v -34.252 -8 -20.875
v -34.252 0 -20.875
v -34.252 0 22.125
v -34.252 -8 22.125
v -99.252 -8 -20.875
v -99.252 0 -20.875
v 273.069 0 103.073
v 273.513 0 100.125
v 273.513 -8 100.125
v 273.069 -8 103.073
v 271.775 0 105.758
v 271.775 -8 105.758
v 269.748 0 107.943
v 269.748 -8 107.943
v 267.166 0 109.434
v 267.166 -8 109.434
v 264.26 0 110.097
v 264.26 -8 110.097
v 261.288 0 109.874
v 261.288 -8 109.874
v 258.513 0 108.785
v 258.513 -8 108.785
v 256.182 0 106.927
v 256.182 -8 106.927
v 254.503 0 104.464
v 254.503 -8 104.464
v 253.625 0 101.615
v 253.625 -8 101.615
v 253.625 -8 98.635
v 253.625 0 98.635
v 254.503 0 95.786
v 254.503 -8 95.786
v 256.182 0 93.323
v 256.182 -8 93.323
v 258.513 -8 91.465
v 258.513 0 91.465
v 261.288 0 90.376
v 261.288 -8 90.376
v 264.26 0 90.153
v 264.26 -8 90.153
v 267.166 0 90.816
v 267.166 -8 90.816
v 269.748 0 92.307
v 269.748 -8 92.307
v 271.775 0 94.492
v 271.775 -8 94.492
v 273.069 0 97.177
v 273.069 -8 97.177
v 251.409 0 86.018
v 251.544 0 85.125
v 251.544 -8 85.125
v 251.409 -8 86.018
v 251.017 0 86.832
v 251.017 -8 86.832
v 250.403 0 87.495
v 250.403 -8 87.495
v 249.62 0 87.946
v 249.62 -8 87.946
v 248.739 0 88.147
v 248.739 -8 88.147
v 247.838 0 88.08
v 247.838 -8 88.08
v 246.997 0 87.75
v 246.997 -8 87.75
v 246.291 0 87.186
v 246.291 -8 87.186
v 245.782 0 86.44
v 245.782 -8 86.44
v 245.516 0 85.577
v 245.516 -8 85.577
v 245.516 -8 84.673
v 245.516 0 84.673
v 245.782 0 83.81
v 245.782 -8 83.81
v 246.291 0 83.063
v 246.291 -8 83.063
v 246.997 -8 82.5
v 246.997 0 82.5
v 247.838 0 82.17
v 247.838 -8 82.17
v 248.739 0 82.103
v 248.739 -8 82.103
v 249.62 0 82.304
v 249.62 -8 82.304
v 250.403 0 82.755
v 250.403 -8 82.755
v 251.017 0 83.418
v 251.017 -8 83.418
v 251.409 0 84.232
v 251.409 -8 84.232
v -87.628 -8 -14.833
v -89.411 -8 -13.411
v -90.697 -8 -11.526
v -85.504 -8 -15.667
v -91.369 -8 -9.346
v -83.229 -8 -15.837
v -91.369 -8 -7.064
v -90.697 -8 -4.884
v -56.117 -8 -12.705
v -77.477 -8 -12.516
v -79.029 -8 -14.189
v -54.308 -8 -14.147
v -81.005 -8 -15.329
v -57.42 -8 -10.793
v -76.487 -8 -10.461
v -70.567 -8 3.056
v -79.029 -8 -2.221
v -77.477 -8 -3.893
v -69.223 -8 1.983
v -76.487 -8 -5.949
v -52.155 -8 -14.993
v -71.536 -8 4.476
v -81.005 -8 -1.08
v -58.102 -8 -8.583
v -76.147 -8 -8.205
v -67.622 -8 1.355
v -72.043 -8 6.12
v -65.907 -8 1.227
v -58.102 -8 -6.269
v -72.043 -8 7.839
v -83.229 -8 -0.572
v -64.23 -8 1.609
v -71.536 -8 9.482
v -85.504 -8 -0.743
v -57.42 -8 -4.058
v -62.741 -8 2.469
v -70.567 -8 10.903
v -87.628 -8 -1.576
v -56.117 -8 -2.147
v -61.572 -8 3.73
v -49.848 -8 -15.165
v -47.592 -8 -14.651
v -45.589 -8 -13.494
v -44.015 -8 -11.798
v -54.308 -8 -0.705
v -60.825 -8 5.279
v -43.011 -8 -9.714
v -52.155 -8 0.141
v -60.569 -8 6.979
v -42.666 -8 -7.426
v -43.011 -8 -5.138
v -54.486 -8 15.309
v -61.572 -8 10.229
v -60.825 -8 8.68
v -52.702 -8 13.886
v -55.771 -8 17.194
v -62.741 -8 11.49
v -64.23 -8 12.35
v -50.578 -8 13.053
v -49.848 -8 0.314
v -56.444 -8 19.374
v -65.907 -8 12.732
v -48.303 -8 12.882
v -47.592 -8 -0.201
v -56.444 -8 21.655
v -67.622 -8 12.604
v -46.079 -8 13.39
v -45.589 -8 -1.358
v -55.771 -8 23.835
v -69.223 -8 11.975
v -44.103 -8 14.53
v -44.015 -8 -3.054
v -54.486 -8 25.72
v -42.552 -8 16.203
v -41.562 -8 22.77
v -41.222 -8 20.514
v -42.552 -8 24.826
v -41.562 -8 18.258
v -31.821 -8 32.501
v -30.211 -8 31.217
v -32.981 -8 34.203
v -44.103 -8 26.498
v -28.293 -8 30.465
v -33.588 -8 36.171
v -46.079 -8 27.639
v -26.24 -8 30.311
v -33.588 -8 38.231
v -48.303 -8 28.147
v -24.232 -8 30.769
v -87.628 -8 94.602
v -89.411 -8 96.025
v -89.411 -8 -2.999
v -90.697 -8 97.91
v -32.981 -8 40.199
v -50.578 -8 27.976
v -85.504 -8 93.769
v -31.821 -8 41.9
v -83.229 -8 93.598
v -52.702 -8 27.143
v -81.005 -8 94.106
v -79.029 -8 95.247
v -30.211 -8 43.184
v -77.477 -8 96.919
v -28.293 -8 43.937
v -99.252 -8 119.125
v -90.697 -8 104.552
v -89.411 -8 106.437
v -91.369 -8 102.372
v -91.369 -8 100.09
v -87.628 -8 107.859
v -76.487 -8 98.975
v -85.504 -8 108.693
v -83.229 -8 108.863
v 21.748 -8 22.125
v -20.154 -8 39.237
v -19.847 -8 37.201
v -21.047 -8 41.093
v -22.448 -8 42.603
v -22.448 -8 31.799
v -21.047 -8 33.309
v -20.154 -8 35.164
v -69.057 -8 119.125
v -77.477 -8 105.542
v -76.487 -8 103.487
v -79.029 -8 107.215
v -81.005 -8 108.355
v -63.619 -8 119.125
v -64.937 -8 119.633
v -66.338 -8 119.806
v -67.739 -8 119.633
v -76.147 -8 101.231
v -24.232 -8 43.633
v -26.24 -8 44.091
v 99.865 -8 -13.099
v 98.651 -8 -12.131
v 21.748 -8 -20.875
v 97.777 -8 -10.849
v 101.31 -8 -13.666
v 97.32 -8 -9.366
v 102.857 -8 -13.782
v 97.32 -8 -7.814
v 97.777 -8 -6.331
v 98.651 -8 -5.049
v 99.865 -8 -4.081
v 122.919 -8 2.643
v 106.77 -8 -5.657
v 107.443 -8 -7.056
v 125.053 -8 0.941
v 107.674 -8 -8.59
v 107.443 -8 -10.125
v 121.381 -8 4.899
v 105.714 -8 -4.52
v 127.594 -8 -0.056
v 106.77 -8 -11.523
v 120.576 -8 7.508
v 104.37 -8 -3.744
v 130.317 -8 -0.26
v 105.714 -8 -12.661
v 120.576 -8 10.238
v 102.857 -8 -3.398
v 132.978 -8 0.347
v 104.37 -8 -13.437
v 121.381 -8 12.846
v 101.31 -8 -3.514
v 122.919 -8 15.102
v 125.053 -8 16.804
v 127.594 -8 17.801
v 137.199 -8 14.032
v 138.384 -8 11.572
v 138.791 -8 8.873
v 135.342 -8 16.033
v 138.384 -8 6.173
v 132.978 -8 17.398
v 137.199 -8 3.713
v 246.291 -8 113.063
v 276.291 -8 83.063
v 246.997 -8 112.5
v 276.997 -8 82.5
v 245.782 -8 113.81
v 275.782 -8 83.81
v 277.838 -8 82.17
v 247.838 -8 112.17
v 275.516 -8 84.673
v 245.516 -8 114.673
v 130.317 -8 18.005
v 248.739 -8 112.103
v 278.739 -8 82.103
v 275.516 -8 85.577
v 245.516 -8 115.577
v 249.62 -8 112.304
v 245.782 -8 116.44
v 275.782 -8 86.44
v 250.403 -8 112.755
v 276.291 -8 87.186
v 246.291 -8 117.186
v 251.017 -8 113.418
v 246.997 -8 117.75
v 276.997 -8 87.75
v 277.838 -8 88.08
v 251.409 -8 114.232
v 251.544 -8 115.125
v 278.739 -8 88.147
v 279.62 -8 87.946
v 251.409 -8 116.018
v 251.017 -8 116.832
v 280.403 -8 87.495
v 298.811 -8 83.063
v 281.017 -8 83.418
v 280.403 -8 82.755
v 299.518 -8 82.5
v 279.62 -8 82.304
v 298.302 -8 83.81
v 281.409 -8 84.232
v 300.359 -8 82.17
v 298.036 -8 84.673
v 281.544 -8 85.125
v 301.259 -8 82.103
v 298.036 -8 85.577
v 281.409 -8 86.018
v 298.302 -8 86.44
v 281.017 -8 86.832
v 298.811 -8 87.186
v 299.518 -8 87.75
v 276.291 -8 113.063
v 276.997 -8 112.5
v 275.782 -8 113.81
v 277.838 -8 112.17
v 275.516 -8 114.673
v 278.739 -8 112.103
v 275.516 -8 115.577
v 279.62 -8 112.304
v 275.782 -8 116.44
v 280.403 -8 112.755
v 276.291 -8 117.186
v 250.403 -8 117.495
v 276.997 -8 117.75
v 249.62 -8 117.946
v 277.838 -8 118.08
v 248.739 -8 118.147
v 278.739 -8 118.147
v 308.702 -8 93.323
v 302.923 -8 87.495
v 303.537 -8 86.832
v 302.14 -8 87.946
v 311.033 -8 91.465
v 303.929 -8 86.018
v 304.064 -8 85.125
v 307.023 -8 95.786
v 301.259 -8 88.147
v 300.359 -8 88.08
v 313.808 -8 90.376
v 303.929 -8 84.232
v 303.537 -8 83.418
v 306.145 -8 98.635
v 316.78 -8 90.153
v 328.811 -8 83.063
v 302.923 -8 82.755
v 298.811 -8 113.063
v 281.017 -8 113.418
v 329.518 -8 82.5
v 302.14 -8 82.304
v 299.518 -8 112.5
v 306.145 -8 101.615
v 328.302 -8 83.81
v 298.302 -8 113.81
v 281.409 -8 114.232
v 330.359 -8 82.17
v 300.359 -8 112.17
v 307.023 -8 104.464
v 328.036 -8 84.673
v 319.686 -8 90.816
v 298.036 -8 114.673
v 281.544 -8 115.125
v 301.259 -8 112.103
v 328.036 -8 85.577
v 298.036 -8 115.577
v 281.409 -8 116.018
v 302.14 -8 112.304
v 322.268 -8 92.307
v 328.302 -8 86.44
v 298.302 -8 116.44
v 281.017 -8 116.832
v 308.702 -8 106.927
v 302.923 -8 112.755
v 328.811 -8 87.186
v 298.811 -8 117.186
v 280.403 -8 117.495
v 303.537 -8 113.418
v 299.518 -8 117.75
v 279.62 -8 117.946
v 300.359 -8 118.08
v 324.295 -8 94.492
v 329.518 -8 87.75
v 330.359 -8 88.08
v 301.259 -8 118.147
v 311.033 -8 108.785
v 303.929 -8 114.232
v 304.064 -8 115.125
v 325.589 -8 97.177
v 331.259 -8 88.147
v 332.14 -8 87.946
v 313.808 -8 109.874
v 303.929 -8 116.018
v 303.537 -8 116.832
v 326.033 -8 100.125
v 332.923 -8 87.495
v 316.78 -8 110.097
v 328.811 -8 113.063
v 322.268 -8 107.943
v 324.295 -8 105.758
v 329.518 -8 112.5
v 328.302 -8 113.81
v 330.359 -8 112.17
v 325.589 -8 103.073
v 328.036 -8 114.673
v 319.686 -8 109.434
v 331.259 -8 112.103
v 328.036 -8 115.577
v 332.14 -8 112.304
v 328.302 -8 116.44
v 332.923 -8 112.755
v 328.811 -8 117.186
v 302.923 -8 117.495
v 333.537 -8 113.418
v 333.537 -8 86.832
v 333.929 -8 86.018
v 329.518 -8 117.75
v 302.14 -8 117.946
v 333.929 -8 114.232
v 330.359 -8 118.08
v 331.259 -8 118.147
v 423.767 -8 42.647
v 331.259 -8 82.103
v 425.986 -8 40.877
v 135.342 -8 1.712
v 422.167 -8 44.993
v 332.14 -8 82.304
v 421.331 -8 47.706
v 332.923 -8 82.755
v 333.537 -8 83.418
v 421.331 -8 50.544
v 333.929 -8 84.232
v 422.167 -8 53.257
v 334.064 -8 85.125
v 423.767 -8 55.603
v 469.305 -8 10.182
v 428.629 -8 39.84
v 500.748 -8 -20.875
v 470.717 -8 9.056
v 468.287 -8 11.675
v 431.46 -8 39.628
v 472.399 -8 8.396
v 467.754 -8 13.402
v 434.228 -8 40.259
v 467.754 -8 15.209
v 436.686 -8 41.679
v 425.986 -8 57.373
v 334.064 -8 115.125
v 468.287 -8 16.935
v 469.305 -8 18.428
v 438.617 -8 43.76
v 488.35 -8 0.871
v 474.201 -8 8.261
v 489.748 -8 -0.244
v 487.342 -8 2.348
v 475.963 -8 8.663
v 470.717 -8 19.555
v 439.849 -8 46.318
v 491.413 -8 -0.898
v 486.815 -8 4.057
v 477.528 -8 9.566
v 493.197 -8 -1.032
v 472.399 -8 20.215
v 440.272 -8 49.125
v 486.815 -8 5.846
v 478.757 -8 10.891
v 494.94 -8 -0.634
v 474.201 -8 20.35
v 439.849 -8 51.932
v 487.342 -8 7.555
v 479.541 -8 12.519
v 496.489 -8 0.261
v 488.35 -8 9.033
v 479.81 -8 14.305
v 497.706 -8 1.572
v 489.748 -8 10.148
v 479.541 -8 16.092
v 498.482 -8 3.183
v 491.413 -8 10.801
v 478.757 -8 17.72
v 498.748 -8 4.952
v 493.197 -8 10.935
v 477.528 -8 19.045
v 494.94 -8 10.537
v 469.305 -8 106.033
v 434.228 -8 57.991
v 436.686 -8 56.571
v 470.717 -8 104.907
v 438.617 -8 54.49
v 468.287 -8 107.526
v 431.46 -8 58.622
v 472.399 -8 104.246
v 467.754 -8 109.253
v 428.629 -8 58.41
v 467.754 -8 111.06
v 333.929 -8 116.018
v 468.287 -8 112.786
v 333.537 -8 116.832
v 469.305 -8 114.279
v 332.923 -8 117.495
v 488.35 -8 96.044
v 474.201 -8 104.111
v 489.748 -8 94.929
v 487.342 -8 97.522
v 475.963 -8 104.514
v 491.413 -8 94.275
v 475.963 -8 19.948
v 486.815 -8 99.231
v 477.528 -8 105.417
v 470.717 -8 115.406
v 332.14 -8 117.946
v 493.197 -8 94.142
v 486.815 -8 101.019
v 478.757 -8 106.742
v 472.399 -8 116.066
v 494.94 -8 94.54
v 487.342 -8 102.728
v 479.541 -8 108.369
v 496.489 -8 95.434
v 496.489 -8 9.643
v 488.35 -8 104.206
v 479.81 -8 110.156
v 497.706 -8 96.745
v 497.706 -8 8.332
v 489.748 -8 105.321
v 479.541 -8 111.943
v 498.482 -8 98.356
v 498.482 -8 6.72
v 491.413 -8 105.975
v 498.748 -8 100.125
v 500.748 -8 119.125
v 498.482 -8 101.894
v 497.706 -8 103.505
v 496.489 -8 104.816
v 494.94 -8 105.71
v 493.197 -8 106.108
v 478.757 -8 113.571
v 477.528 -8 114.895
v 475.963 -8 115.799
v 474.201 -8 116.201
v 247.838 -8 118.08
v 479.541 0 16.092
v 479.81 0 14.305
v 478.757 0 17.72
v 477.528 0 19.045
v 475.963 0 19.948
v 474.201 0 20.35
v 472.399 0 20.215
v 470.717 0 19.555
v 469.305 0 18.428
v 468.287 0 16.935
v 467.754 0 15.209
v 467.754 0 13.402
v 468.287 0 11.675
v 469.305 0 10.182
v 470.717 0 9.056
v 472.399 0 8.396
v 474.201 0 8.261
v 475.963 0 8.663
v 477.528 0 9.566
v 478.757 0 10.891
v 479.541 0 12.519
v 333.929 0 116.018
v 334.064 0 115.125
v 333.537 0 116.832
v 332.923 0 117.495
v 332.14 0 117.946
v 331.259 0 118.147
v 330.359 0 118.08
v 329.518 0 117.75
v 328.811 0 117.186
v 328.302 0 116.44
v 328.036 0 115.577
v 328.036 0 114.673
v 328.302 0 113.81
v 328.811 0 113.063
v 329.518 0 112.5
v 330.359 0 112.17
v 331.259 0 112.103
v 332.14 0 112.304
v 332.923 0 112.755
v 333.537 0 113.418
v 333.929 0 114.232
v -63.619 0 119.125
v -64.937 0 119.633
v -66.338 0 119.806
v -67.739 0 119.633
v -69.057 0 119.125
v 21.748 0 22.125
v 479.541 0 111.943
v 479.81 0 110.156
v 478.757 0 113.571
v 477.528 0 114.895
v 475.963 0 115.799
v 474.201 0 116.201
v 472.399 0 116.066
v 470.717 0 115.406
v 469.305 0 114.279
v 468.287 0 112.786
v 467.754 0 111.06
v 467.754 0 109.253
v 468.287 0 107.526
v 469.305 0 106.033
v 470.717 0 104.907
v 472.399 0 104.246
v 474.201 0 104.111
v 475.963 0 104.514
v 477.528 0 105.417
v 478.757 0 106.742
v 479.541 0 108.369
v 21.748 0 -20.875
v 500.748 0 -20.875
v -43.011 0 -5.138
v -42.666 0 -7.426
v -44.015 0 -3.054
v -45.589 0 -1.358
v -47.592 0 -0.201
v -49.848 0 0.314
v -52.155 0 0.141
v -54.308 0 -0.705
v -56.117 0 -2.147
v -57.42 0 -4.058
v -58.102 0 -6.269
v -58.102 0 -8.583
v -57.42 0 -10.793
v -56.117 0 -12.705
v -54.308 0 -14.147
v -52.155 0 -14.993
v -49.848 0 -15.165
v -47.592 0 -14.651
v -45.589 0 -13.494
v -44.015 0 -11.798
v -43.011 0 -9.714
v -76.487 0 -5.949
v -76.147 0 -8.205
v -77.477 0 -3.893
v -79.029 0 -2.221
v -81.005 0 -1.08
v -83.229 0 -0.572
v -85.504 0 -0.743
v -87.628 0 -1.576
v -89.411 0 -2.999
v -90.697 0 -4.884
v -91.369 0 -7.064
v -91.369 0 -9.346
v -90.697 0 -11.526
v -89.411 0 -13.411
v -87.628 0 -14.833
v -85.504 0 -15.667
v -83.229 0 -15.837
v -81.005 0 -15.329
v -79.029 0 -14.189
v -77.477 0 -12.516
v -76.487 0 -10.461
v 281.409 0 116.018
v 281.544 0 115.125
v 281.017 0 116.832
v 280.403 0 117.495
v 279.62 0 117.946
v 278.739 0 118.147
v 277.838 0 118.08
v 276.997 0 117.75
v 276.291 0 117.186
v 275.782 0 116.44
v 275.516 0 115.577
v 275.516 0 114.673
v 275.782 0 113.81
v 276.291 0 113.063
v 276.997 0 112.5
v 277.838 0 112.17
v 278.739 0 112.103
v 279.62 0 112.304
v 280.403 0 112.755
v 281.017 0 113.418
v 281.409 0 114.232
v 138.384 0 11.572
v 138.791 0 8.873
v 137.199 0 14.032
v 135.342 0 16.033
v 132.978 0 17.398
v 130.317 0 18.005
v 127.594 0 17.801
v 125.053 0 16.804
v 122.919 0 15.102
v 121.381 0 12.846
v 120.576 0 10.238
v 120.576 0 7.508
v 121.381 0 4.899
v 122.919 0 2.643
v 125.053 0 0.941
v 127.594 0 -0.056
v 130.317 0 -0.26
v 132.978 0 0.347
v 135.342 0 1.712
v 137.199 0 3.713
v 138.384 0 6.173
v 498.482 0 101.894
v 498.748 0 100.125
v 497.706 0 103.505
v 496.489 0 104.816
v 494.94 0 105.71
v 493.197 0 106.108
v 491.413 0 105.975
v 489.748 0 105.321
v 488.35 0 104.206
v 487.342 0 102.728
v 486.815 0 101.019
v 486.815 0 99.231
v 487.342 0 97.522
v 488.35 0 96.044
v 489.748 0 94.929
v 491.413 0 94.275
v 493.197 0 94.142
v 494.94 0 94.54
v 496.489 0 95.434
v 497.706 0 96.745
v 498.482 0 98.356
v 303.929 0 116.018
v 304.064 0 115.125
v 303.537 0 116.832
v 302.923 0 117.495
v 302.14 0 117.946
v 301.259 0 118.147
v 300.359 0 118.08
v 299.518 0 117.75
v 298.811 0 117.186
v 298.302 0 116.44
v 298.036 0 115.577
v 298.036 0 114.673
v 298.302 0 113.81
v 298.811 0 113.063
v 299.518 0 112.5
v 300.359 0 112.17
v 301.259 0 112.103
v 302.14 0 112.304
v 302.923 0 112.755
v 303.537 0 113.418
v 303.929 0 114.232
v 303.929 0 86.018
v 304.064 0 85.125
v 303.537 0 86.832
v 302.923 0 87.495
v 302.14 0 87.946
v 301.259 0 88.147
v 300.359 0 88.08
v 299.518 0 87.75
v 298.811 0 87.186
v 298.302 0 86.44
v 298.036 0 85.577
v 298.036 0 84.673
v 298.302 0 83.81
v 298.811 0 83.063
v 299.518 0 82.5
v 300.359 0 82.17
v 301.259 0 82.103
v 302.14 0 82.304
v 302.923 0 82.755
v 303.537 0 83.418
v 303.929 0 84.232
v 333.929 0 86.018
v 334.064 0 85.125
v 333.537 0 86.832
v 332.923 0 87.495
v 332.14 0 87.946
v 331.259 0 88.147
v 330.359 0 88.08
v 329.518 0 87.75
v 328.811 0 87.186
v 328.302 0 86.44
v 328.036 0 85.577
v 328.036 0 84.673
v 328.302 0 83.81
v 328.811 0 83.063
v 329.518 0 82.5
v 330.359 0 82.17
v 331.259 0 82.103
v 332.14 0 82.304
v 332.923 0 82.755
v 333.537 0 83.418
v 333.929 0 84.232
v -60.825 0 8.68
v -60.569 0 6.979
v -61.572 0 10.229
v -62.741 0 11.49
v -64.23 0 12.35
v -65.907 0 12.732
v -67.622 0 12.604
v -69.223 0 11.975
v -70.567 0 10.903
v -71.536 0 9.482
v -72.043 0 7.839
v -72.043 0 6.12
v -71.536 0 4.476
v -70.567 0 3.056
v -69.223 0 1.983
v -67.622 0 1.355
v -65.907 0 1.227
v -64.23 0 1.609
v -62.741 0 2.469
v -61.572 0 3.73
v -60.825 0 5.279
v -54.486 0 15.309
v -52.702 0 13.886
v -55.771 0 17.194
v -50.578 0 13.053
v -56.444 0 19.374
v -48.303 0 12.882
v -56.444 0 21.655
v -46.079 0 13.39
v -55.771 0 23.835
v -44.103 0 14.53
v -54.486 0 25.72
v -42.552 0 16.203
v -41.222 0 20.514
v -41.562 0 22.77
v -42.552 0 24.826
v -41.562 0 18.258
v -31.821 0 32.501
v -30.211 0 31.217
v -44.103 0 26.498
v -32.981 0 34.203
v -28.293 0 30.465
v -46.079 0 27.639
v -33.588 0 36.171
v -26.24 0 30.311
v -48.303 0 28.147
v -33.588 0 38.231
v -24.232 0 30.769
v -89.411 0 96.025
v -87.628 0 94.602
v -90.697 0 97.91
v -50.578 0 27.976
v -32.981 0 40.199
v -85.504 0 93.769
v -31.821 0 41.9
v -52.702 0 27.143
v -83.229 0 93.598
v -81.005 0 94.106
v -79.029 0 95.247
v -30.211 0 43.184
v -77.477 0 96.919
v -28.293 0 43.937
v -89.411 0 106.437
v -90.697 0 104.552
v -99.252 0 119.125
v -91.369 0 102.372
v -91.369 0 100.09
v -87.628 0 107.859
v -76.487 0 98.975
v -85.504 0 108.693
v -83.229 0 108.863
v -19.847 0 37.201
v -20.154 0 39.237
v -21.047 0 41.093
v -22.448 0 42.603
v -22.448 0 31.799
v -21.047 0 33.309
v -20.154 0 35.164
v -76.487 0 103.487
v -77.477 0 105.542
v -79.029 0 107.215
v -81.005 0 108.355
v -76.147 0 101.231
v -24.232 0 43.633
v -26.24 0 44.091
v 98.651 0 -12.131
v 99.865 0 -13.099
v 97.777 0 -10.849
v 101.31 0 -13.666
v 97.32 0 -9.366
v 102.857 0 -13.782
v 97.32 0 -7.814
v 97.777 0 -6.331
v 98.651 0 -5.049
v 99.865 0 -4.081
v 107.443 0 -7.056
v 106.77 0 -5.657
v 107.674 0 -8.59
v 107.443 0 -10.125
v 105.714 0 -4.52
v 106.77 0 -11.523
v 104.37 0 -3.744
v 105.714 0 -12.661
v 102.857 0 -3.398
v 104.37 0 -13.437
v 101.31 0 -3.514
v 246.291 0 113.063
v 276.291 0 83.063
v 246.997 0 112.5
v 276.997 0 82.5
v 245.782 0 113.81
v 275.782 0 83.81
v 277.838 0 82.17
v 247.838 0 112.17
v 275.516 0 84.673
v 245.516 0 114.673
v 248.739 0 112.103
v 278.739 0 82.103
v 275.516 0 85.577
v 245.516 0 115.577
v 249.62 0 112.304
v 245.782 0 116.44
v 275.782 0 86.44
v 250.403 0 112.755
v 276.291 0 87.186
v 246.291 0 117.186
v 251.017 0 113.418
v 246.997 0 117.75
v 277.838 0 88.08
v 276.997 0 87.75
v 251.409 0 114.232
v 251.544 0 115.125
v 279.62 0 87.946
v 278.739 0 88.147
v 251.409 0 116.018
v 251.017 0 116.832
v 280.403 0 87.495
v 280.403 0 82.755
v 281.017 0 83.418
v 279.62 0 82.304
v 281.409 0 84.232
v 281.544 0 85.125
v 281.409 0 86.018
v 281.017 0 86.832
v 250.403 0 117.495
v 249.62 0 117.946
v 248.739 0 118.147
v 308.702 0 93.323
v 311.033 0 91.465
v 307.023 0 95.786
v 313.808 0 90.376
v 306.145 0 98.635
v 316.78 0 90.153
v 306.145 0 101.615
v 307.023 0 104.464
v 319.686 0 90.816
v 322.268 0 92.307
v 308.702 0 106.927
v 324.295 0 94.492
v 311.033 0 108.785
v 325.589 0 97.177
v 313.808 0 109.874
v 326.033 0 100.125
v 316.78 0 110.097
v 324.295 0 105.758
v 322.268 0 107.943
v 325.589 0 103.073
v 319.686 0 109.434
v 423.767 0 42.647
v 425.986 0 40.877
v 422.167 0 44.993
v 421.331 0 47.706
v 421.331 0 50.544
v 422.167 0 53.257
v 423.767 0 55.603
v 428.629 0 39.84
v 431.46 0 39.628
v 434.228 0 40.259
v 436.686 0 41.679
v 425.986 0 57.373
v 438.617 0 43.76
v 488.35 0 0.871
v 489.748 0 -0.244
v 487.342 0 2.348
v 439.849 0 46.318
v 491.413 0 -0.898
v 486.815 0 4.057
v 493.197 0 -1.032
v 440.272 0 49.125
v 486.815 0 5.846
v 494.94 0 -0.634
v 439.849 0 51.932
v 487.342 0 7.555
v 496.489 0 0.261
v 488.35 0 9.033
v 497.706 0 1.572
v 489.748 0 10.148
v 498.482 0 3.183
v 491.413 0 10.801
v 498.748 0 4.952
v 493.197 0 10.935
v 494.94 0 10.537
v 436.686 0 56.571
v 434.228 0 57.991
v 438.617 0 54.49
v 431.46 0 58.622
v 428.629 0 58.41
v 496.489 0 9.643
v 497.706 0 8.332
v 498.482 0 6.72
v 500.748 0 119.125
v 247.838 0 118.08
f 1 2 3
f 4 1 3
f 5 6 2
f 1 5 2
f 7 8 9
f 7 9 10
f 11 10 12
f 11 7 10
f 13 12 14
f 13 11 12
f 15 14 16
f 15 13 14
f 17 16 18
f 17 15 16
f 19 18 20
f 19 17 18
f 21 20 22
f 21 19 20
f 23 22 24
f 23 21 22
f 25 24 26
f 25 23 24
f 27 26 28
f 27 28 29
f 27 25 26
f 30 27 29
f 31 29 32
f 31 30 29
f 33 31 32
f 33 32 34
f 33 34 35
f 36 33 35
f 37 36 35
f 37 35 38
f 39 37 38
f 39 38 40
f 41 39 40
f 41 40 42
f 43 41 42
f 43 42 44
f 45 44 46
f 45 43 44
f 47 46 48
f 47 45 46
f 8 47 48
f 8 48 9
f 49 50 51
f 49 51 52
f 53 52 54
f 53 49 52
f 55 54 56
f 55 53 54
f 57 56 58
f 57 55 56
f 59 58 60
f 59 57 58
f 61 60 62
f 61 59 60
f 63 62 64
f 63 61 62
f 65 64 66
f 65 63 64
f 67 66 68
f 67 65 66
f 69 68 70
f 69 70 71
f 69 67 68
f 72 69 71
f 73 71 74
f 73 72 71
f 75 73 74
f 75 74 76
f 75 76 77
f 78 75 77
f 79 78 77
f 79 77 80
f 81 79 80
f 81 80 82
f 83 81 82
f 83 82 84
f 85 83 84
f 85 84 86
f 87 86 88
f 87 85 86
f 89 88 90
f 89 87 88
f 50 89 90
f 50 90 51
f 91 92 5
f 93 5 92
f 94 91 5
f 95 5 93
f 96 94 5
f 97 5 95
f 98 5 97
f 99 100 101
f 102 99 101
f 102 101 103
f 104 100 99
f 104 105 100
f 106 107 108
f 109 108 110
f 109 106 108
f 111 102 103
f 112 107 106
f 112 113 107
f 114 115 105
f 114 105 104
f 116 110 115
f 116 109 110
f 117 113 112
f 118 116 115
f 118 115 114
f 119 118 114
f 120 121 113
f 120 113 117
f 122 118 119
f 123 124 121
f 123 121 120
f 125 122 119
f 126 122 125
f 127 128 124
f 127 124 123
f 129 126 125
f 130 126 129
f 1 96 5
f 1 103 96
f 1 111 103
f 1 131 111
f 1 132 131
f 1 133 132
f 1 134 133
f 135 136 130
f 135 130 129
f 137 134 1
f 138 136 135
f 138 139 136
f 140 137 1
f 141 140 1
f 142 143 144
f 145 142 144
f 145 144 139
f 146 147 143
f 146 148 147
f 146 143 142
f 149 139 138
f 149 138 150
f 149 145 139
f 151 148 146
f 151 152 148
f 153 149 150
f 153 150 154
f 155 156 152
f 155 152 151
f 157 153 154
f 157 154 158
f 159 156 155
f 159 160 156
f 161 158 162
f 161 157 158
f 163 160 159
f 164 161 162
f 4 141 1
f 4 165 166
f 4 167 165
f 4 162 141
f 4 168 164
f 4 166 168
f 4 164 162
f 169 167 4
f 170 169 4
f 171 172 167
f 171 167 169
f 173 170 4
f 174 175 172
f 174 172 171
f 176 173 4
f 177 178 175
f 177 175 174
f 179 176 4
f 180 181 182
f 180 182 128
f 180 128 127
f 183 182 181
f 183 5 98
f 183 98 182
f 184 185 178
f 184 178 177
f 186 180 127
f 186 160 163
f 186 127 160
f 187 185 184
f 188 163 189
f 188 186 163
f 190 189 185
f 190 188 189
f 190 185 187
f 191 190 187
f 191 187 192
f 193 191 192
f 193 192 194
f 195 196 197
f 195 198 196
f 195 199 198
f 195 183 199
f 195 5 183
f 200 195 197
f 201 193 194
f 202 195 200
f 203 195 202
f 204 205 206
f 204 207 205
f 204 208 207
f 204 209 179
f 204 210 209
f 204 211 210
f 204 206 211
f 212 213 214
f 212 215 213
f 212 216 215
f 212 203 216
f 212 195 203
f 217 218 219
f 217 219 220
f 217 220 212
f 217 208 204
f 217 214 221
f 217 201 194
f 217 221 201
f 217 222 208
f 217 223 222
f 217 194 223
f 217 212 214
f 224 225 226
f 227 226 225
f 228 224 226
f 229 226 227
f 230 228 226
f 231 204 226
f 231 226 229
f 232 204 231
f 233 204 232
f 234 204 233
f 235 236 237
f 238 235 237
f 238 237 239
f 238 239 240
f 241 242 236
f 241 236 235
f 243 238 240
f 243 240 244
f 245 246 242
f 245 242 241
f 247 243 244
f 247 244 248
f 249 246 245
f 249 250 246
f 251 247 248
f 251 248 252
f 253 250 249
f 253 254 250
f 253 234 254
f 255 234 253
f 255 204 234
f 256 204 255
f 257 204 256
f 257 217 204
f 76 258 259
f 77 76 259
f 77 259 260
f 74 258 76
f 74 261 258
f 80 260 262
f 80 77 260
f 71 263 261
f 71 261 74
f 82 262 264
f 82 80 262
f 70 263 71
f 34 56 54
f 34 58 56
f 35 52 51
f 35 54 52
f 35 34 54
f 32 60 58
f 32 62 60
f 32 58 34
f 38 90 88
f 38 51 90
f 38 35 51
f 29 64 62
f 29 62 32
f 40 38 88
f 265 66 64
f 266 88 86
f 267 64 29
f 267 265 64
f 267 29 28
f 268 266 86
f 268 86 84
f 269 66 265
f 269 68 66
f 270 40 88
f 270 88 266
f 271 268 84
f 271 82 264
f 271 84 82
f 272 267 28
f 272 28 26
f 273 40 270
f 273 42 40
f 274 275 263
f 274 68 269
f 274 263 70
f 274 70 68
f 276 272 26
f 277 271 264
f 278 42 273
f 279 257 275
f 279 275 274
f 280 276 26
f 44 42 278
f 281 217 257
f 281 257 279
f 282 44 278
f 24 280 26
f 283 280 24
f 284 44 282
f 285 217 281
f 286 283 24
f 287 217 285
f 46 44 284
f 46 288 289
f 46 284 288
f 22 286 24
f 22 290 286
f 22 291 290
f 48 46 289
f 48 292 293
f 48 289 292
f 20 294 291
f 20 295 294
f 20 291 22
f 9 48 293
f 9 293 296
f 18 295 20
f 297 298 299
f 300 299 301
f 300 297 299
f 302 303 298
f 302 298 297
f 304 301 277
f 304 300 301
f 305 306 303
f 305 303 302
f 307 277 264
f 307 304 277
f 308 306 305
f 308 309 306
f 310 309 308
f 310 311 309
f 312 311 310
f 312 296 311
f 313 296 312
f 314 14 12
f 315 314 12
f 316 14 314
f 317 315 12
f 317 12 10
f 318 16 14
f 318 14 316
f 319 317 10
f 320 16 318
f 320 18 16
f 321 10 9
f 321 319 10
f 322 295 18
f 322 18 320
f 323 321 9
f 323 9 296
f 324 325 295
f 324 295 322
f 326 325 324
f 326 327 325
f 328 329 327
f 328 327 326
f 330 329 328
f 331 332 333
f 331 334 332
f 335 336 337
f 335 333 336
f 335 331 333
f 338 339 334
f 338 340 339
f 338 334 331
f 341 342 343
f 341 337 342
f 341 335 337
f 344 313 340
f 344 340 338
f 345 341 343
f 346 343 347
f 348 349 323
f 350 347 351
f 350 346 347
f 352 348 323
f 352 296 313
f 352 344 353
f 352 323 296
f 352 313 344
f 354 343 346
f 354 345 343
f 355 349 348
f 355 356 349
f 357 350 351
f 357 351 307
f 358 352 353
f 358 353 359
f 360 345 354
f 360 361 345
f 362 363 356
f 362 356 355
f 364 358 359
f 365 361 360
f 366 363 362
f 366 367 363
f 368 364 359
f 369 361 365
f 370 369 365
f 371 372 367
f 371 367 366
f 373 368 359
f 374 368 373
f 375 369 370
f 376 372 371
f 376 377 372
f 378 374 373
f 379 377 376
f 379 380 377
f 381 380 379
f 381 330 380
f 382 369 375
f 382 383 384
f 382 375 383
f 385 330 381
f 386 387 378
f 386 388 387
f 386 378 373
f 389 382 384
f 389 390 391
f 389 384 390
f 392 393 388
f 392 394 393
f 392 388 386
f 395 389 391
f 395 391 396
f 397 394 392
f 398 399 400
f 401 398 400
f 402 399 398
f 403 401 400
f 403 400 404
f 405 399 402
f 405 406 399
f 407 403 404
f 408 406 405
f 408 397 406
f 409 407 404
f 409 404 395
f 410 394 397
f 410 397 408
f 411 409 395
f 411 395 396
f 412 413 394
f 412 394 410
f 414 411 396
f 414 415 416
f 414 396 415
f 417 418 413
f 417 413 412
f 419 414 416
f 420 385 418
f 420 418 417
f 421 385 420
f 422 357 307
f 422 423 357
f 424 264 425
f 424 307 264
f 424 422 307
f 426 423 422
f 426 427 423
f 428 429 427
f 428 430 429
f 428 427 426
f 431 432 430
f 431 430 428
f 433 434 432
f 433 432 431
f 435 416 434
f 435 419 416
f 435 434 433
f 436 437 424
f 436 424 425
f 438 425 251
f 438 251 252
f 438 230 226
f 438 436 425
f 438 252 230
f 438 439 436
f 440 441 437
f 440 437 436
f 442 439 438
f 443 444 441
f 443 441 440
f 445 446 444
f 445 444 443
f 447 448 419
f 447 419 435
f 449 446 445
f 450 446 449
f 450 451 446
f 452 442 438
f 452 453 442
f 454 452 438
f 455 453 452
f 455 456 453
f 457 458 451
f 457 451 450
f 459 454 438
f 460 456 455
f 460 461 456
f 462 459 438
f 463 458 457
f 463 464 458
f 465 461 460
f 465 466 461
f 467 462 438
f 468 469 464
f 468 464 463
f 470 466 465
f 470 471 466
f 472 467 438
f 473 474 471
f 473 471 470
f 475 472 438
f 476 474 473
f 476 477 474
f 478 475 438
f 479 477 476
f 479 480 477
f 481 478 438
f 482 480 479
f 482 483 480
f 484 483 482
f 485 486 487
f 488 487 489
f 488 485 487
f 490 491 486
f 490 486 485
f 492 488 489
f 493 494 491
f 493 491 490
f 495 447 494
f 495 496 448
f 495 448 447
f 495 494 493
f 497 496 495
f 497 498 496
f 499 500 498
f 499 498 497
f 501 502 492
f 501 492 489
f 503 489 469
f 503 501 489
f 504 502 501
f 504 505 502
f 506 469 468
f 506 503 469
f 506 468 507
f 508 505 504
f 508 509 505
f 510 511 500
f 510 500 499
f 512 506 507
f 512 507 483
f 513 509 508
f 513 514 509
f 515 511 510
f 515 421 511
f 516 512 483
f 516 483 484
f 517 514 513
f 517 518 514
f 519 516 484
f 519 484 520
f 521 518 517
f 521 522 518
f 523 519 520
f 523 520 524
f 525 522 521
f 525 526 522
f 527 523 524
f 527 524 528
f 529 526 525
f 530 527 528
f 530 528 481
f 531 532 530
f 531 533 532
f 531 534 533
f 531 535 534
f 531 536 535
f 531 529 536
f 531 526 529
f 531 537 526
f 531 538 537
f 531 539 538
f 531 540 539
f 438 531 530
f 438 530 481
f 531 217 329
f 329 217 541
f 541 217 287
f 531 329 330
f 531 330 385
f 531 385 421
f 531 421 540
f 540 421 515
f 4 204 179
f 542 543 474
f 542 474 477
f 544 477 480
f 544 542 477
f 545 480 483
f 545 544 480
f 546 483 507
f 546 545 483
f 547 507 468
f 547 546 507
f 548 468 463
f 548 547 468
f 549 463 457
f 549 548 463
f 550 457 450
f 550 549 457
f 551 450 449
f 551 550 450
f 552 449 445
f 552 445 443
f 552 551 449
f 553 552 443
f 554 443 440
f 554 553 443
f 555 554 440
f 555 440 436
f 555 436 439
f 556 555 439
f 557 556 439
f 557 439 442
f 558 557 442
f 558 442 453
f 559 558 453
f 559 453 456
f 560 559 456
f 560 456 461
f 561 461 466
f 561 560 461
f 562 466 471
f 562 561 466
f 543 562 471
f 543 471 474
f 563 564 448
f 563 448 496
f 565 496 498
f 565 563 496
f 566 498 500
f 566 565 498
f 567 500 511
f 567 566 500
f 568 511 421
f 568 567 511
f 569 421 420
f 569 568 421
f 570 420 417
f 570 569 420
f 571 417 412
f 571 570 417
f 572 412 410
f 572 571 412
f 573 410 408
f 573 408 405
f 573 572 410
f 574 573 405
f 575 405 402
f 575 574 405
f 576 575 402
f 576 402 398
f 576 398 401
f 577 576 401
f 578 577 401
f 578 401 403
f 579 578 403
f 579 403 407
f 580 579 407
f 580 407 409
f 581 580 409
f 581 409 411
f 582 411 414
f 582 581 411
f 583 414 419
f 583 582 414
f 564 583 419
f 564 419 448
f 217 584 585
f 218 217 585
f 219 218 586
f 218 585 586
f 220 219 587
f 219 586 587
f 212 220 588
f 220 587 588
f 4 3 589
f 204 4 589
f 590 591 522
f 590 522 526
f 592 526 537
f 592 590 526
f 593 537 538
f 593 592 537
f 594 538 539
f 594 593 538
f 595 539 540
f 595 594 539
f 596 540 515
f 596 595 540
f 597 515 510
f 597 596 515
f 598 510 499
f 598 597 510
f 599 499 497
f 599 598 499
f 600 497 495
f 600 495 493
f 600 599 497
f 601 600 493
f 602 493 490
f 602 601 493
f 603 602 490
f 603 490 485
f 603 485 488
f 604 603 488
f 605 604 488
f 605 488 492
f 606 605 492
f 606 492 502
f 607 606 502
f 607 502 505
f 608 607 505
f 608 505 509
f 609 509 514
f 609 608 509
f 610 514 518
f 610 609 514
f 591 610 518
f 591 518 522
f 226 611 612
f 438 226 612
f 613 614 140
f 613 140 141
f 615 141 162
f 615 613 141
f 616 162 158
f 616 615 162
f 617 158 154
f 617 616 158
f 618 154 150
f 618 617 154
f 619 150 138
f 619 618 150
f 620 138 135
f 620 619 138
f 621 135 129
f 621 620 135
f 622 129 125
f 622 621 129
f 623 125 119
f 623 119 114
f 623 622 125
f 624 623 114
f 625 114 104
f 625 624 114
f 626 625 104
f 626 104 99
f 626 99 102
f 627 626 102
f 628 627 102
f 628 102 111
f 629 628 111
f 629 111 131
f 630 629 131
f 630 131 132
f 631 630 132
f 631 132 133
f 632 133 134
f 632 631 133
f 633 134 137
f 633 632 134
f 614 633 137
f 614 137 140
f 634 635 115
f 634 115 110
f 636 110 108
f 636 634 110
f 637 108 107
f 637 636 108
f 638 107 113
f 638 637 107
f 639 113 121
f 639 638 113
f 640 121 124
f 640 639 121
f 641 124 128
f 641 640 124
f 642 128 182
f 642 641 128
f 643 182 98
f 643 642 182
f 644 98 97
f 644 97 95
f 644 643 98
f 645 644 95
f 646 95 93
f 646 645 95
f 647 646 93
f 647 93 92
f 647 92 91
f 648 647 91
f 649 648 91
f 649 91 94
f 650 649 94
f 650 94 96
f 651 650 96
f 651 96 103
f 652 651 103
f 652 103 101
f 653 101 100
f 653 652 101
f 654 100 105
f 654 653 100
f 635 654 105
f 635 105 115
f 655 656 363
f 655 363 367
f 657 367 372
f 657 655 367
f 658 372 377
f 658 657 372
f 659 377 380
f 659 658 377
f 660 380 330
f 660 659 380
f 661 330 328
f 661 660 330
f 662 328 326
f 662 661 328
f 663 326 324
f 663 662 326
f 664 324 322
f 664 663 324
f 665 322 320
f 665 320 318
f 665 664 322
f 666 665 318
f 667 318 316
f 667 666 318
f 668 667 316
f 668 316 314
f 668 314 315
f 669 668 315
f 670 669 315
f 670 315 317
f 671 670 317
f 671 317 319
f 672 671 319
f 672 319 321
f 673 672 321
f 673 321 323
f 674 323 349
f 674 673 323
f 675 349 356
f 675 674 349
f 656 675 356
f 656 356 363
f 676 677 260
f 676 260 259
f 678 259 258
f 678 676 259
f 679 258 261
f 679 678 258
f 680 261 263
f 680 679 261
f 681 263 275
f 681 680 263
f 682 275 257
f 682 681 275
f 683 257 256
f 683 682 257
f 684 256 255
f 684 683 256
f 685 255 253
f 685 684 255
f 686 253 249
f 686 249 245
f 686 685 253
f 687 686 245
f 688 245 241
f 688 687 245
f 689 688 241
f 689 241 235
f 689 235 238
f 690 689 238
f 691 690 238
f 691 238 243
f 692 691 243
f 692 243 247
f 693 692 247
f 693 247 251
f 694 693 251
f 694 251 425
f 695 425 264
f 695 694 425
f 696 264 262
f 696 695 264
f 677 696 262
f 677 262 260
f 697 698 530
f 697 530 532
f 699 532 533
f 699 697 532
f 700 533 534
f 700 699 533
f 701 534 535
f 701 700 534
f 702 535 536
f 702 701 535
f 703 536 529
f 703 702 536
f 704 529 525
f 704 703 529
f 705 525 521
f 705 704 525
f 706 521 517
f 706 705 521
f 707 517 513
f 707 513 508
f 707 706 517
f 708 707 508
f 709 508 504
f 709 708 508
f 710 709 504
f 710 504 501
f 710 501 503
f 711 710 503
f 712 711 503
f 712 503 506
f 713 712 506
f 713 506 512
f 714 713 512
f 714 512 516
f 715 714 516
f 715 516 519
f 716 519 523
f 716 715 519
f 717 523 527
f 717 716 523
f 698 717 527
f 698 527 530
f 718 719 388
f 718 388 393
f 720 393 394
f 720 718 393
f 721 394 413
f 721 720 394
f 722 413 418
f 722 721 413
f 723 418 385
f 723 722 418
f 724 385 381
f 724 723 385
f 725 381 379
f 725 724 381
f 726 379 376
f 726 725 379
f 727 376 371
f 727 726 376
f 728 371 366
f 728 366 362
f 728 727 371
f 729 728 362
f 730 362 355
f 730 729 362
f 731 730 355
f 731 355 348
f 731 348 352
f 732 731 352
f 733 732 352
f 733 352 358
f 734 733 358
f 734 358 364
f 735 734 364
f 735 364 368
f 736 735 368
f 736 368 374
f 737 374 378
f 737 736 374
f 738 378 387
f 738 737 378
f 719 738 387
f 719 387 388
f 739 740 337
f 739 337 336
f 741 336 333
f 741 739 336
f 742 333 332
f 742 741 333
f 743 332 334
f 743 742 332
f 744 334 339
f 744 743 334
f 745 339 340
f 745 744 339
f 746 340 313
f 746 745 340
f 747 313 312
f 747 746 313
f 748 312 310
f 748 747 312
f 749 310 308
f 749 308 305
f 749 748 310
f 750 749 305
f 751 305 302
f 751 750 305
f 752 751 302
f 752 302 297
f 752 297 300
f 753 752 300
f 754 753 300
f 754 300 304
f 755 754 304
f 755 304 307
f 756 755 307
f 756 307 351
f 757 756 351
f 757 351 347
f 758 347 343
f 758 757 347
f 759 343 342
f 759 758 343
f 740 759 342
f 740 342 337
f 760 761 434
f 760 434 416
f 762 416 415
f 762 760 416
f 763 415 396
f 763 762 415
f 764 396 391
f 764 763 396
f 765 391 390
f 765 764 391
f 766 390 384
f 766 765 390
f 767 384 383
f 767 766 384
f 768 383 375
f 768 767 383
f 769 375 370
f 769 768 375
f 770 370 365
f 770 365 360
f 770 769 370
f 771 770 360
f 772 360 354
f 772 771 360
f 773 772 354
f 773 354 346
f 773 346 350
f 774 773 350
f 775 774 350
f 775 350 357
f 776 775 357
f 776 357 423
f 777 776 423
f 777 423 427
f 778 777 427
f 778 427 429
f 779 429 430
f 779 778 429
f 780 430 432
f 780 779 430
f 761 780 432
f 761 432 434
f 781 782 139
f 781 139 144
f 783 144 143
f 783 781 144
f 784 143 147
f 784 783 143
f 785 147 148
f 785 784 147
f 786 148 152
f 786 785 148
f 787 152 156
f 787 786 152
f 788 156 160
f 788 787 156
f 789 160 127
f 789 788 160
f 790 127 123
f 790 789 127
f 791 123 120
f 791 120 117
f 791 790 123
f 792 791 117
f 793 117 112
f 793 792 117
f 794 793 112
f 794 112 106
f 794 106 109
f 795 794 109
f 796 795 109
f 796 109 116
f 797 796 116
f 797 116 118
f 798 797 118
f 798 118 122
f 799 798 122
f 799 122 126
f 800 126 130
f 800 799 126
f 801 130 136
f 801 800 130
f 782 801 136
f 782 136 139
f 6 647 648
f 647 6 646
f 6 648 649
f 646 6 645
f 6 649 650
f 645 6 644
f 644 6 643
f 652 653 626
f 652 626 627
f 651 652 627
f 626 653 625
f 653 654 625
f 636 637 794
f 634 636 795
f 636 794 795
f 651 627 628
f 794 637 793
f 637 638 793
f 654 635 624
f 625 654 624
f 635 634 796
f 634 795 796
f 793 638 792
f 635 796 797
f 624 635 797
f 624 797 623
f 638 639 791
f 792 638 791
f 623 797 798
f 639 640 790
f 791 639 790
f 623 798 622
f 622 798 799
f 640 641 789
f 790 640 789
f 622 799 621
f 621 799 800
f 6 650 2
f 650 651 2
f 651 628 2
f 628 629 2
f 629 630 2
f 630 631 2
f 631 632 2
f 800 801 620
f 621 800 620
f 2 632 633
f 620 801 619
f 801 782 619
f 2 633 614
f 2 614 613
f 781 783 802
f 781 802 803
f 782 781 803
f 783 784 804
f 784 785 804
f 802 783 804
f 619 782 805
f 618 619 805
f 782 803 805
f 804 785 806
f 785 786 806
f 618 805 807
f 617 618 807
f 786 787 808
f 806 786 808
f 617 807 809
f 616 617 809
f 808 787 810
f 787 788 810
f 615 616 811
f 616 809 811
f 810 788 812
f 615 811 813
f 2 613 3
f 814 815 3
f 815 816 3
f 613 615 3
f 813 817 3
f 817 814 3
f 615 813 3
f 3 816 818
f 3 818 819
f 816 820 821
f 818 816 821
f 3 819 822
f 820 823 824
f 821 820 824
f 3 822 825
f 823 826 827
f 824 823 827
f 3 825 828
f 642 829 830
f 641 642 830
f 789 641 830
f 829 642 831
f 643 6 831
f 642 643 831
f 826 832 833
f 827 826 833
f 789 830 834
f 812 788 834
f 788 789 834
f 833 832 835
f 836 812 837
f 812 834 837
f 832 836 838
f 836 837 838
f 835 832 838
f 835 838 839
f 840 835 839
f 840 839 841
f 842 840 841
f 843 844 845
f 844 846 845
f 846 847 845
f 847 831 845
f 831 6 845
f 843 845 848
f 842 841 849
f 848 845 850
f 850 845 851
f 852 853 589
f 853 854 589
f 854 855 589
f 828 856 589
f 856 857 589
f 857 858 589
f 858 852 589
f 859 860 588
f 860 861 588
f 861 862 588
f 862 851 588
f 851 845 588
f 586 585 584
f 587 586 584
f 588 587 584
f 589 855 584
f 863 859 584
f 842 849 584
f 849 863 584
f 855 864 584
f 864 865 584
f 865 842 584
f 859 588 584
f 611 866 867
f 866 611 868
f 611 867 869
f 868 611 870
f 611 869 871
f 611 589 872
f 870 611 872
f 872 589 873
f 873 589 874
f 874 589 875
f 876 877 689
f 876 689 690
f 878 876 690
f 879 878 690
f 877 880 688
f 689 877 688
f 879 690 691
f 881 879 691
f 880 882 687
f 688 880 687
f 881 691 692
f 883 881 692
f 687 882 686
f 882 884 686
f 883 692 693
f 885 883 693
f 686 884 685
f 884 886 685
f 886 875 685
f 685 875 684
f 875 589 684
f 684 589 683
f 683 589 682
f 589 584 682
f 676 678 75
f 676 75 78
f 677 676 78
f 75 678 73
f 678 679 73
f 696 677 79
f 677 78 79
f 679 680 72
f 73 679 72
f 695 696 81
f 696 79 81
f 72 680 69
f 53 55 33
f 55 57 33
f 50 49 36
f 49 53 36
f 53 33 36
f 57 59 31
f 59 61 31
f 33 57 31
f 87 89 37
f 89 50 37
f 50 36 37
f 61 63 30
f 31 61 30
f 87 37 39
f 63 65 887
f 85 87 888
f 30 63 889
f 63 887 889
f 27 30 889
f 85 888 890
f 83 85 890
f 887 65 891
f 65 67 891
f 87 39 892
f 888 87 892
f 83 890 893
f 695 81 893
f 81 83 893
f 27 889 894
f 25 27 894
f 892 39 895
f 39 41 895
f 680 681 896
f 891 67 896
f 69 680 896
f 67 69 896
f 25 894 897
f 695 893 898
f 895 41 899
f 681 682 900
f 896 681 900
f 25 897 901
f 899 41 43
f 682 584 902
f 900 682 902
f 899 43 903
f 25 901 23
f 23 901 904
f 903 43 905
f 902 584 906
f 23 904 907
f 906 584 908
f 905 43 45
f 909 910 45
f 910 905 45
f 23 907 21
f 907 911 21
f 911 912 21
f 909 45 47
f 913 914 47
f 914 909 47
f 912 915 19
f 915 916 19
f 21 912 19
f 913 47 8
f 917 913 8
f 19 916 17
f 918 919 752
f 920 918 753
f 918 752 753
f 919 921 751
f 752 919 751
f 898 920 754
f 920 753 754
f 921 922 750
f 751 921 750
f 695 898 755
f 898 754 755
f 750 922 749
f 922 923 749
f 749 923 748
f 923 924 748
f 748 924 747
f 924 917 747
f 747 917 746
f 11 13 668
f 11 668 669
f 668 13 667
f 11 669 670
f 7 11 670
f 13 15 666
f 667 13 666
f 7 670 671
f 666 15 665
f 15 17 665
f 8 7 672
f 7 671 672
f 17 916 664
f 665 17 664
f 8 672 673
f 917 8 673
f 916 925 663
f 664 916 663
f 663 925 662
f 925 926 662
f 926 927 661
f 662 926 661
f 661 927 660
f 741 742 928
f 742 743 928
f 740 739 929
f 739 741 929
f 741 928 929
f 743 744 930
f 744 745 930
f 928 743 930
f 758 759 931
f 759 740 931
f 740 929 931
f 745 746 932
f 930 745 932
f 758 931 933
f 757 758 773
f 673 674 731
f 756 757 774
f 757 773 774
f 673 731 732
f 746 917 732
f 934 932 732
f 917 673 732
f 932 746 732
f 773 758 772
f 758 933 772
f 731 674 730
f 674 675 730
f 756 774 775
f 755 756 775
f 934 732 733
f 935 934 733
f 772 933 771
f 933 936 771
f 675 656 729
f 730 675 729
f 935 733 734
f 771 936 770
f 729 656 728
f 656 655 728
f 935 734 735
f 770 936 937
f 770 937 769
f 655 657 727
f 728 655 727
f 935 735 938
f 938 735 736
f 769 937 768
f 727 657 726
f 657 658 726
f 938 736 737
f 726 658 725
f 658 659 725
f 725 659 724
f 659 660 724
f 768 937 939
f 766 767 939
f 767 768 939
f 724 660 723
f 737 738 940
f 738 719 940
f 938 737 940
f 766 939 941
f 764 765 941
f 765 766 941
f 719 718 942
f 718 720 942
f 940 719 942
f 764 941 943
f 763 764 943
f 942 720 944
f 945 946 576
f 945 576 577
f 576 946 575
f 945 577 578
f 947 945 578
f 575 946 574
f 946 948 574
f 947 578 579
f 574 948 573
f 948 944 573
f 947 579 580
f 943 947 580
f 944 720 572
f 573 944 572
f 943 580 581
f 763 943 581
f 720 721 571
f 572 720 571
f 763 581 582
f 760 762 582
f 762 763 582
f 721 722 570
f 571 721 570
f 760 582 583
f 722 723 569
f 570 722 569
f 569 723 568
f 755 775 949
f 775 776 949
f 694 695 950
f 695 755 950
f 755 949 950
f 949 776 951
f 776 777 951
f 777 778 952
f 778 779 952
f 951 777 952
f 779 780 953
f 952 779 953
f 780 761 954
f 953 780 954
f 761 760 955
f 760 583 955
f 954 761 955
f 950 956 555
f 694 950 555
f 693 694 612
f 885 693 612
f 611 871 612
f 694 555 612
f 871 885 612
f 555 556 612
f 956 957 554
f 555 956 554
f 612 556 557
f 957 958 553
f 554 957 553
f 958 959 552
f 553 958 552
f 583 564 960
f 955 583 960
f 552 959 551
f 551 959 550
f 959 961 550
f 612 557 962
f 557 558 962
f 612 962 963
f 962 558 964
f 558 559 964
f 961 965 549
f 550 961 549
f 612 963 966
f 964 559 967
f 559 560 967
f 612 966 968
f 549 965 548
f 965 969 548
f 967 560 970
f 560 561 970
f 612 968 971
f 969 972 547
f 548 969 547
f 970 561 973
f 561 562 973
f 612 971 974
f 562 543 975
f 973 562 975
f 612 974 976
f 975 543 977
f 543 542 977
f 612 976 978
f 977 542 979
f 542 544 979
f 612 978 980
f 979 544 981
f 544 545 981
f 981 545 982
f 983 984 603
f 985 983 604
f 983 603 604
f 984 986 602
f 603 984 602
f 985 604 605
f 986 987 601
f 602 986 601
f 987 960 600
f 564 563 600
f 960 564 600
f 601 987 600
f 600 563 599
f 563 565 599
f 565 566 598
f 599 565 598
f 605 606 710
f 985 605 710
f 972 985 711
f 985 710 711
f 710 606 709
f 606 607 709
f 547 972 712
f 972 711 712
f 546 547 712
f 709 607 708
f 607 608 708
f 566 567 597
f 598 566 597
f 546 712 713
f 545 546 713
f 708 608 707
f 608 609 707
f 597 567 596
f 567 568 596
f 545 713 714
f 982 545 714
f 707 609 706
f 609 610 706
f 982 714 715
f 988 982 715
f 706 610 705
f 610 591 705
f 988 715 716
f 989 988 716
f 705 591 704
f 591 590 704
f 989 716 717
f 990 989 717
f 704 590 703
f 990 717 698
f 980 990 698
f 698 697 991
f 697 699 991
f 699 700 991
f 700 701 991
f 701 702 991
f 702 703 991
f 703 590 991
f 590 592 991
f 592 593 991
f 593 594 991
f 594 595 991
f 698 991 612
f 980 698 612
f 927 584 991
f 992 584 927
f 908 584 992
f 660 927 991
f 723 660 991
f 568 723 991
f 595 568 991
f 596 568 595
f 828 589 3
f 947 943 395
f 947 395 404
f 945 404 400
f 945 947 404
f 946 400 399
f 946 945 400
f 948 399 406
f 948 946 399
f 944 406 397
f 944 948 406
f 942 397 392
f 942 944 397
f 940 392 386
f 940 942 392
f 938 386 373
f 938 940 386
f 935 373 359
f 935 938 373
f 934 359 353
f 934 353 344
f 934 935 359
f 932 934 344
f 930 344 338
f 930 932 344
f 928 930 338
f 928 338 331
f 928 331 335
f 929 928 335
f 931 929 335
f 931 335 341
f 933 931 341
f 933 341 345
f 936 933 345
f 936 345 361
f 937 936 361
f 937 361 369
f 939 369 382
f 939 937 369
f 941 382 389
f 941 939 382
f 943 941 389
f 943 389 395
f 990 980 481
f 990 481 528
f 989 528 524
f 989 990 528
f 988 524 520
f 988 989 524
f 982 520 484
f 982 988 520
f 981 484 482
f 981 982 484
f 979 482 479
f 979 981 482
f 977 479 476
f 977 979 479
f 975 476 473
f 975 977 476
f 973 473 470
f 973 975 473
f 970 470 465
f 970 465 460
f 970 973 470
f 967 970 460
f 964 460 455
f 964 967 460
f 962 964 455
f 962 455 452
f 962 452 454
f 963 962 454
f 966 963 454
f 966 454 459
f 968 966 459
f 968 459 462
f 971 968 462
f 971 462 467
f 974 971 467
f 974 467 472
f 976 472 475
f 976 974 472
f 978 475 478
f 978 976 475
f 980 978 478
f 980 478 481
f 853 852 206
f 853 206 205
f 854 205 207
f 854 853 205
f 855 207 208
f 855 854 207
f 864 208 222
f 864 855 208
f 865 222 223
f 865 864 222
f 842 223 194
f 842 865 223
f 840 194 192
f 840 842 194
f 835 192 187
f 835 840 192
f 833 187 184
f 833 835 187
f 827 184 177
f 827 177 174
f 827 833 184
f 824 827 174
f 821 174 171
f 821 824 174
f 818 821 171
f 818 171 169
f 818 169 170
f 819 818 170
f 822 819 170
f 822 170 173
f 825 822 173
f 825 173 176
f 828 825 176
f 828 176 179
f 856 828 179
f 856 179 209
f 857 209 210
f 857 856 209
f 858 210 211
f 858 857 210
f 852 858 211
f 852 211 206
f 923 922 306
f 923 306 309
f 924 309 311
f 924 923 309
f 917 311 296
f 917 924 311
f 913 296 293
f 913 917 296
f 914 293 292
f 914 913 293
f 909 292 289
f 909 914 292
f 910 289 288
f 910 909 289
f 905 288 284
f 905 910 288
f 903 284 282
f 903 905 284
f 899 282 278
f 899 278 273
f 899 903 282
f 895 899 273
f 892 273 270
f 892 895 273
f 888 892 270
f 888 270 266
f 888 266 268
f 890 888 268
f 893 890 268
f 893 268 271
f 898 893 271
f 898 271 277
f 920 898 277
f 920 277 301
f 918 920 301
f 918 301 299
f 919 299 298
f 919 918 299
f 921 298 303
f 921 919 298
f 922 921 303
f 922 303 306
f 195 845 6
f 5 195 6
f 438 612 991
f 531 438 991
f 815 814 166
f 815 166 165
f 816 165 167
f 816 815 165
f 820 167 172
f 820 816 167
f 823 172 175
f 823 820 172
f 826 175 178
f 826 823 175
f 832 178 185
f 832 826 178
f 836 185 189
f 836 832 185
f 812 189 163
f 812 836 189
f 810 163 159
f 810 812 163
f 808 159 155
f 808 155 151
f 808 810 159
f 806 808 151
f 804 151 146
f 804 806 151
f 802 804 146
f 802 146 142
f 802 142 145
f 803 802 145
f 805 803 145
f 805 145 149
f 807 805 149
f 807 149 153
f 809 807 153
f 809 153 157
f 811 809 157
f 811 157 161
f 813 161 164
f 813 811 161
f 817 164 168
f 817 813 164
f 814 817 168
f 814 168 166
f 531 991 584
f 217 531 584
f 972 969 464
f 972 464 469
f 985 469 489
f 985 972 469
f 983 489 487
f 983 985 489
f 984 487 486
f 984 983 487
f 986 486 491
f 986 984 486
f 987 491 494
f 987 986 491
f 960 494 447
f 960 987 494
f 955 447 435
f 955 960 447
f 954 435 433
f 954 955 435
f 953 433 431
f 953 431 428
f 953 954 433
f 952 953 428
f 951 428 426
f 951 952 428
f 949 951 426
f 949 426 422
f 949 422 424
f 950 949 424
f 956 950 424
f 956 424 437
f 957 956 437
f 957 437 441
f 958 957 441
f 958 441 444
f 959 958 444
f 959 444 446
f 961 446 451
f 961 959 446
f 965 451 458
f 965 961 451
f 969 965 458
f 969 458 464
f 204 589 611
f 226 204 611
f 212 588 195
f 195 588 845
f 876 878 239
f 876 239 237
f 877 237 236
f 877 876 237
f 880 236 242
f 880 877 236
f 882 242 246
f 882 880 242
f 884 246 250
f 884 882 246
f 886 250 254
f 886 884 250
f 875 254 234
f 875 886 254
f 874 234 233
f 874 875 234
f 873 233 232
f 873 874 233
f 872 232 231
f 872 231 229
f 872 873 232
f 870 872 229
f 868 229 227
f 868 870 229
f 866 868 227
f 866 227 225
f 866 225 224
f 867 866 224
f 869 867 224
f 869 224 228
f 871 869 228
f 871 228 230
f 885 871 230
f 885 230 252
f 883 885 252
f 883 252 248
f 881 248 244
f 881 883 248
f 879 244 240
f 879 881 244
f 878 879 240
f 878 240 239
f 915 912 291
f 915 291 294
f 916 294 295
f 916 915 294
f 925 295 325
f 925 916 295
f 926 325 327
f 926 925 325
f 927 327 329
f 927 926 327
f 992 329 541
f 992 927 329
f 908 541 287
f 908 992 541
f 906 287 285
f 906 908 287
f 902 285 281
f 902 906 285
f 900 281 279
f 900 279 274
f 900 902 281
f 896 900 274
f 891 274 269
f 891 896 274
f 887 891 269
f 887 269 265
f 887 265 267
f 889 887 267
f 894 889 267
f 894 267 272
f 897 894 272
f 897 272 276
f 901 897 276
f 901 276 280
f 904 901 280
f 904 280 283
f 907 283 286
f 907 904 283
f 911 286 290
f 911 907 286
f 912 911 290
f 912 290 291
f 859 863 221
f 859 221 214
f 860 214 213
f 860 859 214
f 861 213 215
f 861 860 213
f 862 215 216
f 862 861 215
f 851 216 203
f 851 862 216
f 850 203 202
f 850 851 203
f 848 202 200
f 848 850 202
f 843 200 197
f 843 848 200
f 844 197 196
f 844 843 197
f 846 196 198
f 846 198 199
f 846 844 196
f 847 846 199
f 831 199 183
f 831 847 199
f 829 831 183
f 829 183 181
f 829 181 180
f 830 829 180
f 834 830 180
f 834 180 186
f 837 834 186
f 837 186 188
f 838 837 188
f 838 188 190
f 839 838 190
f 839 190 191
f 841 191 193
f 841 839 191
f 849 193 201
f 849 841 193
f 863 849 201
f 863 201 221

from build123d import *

# Parameters (mm, degrees)
F0_R     = 7.6537390816
F0_R_2   = 7.7611937188
F0_R_3   = 5.768928847
F0_R_4   = 5.2063685011
F0_R_5   = 9.1585436949
F0_R_6   = 7.6537362484
F0_R_7   = 6.909209466
F0_R_8   = 6
F0_R_9   = 6.061699949
F0_R_10  = 9.524
F0_R_11  = 3.0308412697
F0_R_12  = 10
F1_DEPTH = 8


with BuildPart() as f1:
    # F0 (on Front) → F1 (new body)
    with BuildSketch(Plane.XZ):
        with BuildLine():
            Line((500.7482528687, -20.8750167525), (500.7482528687, 119.1249832475))
            Line((500.7482528687, 119.1249832475), (-63.6194095638, 119.1249832475))
            ThreePointArc((-63.6194095638, 119.1249832475), (-61.3901100274, 117.0030250607), (-60.5691185382, 114.0368059278))
            ThreePointArc((-60.5691185382, 114.0368059278), (-69.3042665181, 109.0888685699), (-69.0566852066, 119.1249832475))
            Line((-69.0566852066, 119.1249832475), (-99.2517471313, 119.1249832475))
            Line((-99.2517471313, 119.1249832475), (-99.2517471313, -20.8750167525))
            Line((-99.2517471313, -20.8750167525), (-34.2517471313, -20.8750167525))
            Line((-34.2517471313, -20.8750167525), (-34.2517471313, 22.1249832475))
            Line((-34.2517471313, 22.1249832475), (21.7482528687, 22.1249832475))
            Line((21.7482528687, 22.1249832475), (21.7482528687, -20.8750167525))
            Line((21.7482528687, -20.8750167525), (500.7482528687, -20.8750167525))
        make_face()
        with Locations((-83.8007479906, -8.2048225315)):
            Circle(F0_R, mode=Mode.SUBTRACT)
        with Locations((-50.4275932908, -7.4259503745)):
            Circle(F0_R_2, mode=Mode.SUBTRACT)
        with Locations((-66.3380473852, 6.9793784816)):
            Circle(F0_R_3, mode=Mode.SUBTRACT)
        with Locations((102.4680286646, -8.5901357234)):
            Circle(F0_R_4, mode=Mode.SUBTRACT)
        with Locations((129.6322196722, 8.8725611567)):
            Circle(F0_R_5, mode=Mode.SUBTRACT)
        with Locations((-48.8753542304, 20.5143652856)):
            Circle(F0_R_6, mode=Mode.SUBTRACT)
        with Locations((-26.7559364438, 37.2009426355)):
            Circle(F0_R_7, mode=Mode.SUBTRACT)
        with Locations((492.7482528687, 4.9516526193)):
            Circle(F0_R_8, mode=Mode.SUBTRACT)
        with Locations((473.7482528687, 14.3054015934)):
            Circle(F0_R_9, mode=Mode.SUBTRACT)
        with Locations((430.7482528687, 49.1249832475)):
            Circle(F0_R_10, mode=Mode.SUBTRACT)
        with Locations((-83.8007479906, 101.2308299541)):
            Circle(F0_R, mode=Mode.SUBTRACT)
        with Locations((248.5129094124, 85.1249832475)):
            Circle(F0_R_11, mode=Mode.SUBTRACT)
        with Locations((263.5129094124, 100.1249832475)):
            Circle(F0_R_12, mode=Mode.SUBTRACT)
        with Locations((278.5129094124, 85.1249832475)):
            Circle(F0_R_11, mode=Mode.SUBTRACT)
        with Locations((301.0329669538, 85.1249832475)):
            Circle(F0_R_11, mode=Mode.SUBTRACT)
        with Locations((331.0329669538, 85.1249832475)):
            Circle(F0_R_11, mode=Mode.SUBTRACT)
        with Locations((316.0329669538, 100.1249832475)):
            Circle(F0_R_12, mode=Mode.SUBTRACT)
        with Locations((248.5129094124, 115.1249832475)):
            Circle(F0_R_11, mode=Mode.SUBTRACT)
        with Locations((278.5129094124, 115.1249832475)):
            Circle(F0_R_11, mode=Mode.SUBTRACT)
        with Locations((301.0329669538, 115.1249832475)):
            Circle(F0_R_11, mode=Mode.SUBTRACT)
        with Locations((331.0329669538, 115.1249832475)):
            Circle(F0_R_11, mode=Mode.SUBTRACT)
        with Locations((492.7482528687, 100.1249832475)):
            Circle(F0_R_8, mode=Mode.SUBTRACT)
        with Locations((473.7482528687, 110.1562082767)):
            Circle(F0_R_9, mode=Mode.SUBTRACT)
        with BuildLine():
            ThreePointArc((-60.5691185382, 114.0368059278), (-61.3901100274, 117.0030250607), (-63.6194095638, 119.1249832475))
            Line((-63.6194095638, 119.1249832475), (-69.0566852066, 119.1249832475))
            ThreePointArc((-69.0566852066, 119.1249832475), (-69.3042665181, 109.0888685699), (-60.5691185382, 114.0368059278))
        make_face()
        with BuildLine():
            Line((-69.0566852066, 119.1249832475), (-63.6194095638, 119.1249832475))
            ThreePointArc((-63.6194095638, 119.1249832475), (-66.3380473852, 119.8057347747), (-69.0566852066, 119.1249832475))
        make_face()
    extrude(amount=F1_DEPTH)


solid = f1.part
